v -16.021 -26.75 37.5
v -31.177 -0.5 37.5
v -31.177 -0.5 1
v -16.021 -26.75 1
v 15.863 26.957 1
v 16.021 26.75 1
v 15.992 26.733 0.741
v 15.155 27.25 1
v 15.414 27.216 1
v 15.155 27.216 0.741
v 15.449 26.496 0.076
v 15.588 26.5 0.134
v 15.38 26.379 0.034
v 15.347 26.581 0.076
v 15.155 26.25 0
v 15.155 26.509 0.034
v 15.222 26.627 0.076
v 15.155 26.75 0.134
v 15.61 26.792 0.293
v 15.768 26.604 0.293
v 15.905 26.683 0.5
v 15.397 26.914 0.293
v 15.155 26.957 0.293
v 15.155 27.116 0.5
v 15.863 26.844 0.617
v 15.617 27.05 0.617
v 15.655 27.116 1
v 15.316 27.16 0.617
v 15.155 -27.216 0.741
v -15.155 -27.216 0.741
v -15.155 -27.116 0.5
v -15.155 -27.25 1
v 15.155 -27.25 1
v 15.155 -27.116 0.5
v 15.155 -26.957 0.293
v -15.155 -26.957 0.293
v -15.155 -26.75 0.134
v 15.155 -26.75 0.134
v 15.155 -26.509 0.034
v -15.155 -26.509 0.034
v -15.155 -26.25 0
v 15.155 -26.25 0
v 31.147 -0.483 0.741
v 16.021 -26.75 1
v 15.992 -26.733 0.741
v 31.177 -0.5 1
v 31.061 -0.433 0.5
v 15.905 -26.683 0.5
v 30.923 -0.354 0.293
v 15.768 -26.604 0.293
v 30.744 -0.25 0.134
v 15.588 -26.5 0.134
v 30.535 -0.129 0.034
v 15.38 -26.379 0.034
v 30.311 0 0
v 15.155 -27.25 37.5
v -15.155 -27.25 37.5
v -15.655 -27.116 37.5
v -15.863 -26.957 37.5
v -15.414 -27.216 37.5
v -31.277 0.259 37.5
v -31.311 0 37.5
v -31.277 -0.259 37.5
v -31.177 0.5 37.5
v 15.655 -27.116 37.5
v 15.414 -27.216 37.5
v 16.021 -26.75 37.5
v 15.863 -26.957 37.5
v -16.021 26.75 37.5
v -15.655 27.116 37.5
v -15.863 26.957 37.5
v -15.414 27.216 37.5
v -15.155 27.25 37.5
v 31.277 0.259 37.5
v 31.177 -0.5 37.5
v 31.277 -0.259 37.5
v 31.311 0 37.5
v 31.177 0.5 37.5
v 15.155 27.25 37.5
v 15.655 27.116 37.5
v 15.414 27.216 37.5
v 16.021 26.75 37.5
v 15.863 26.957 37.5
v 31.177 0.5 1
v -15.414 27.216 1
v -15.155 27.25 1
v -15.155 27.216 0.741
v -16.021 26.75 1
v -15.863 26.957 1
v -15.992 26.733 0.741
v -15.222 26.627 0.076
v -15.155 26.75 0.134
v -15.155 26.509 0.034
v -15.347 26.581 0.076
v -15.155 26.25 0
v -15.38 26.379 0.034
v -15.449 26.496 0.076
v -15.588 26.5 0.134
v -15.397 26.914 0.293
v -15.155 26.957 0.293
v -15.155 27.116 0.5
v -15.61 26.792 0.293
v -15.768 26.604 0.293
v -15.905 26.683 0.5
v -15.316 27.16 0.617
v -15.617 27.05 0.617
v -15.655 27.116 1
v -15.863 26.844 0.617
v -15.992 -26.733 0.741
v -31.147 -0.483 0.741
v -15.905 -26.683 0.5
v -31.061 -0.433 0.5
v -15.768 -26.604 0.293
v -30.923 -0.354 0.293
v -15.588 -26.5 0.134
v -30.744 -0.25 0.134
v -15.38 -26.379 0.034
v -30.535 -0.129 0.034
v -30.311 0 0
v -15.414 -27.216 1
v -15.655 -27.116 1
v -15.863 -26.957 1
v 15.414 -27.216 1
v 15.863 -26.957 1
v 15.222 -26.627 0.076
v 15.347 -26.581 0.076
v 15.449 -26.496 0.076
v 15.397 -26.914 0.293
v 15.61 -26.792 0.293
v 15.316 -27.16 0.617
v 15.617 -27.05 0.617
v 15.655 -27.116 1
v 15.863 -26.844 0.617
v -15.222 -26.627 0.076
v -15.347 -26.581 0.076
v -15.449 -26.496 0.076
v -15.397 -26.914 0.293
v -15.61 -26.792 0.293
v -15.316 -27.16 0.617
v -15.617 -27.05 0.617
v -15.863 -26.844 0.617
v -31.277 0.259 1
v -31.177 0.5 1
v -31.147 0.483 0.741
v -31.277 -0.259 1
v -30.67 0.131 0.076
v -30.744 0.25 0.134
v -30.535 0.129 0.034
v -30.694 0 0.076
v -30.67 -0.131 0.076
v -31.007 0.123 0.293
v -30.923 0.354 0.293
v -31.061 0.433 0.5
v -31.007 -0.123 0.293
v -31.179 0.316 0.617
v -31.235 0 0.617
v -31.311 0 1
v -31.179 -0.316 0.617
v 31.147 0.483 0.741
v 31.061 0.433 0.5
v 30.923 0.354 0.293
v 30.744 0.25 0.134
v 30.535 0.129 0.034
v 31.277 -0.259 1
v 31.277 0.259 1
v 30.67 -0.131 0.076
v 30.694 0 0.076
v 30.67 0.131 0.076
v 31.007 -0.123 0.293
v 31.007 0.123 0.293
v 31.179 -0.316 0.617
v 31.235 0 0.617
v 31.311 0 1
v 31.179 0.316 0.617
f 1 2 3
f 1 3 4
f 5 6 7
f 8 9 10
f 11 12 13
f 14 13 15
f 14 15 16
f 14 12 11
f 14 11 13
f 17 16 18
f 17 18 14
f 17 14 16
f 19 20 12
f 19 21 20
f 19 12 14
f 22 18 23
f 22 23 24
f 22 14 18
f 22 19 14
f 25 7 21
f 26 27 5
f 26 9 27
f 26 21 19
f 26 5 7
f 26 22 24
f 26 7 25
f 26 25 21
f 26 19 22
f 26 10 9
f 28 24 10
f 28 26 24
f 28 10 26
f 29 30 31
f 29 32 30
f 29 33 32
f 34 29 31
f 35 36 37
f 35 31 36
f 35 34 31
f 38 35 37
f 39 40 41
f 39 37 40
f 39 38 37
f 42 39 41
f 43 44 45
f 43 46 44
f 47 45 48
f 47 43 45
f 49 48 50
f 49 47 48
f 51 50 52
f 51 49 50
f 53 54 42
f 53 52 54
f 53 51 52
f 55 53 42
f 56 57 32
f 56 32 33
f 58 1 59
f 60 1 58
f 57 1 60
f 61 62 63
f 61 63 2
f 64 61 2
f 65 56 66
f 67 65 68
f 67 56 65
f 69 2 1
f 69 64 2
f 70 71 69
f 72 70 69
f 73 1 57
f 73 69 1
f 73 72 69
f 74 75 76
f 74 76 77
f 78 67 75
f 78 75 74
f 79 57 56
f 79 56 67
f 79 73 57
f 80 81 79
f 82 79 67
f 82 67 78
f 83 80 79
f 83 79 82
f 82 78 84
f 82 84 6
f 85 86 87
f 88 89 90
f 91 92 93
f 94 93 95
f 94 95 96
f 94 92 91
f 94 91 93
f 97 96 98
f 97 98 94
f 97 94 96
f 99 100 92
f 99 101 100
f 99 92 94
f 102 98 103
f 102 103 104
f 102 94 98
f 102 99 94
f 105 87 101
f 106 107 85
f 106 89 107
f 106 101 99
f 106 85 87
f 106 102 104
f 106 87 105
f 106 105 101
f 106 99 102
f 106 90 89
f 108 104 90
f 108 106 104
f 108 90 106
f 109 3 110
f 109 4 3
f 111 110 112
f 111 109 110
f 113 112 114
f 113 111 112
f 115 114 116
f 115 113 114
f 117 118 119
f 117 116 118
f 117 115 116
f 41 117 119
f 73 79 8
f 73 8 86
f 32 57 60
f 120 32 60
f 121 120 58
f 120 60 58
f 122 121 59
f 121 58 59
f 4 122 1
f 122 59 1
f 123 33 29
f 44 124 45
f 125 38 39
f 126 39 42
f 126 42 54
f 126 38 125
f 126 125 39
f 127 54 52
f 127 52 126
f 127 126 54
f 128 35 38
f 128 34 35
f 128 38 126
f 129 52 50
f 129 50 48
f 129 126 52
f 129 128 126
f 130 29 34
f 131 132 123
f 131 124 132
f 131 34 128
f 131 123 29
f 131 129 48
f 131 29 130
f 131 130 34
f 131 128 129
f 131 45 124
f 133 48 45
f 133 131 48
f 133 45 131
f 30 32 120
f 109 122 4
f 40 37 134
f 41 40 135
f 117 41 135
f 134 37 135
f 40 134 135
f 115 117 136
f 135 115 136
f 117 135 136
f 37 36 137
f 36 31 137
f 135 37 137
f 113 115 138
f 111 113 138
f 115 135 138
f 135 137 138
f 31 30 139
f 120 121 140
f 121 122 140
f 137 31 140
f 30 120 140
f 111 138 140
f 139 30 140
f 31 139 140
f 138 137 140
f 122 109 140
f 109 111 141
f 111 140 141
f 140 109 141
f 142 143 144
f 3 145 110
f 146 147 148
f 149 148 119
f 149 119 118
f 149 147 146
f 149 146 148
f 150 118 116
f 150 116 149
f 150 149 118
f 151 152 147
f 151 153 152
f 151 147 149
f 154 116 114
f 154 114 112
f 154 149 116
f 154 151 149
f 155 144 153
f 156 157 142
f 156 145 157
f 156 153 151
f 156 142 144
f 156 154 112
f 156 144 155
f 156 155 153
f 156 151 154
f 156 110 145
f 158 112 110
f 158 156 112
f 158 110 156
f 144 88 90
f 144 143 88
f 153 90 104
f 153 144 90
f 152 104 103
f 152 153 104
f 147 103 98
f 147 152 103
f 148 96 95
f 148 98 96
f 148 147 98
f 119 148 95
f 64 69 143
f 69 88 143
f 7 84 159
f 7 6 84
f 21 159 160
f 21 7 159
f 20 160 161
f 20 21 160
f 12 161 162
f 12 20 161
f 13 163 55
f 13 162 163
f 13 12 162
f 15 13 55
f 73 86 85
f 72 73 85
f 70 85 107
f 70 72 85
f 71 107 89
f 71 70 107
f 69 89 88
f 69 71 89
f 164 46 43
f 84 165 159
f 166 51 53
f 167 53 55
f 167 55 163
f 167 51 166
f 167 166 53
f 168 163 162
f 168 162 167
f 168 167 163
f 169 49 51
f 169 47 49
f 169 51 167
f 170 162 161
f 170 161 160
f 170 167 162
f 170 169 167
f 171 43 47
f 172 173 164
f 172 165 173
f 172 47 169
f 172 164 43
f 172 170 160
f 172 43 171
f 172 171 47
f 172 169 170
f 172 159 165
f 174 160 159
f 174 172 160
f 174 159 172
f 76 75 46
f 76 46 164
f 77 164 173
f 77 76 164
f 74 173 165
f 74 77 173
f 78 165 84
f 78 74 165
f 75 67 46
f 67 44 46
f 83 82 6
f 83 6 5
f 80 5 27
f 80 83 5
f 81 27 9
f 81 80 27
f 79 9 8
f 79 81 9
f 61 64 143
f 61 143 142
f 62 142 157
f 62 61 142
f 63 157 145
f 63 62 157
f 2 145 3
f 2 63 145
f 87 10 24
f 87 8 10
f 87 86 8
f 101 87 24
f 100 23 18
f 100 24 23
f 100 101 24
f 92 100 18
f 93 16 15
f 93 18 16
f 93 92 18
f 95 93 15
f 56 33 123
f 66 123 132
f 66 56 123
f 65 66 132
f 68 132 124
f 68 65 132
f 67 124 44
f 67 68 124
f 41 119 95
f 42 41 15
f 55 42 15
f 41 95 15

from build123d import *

# Parameters (mm, degrees)
F1_DEPTH = 37.5
F2_R     = 1


with BuildPart() as f1:
    # F0 (on Top) → F1 (new body)
    with BuildSketch(Plane.XY):
        Polygon((-15.732795, -27.25), (15.732795, -27.25), (31.46559, 0), (15.732795, 27.25), (-15.732795, 27.25), (-31.46559, 0), align=None)
    extrude(amount=F1_DEPTH)

    # F2
    f2_edges = [f1.edges().sort_by_distance(p)[0] for p in [
        (0, -27.25, 0),
        (23.599192, -13.625, 0),
        (23.599192, 13.625, 0),
        (0, 27.25, 0),
        (-23.599192, 13.625, 0),
        (-23.599192, -13.625, 0),
        (15.732795, -27.25, 18.75),
        (31.46559, 0, 18.75),
        (-15.732795, -27.25, 18.75),
        (-31.46559, 0, 18.75),
        (-15.732795, 27.25, 18.75),
        (15.732795, 27.25, 18.75),
    ]]
    fillet(f2_edges, radius=F2_R)


solid = f1.part
